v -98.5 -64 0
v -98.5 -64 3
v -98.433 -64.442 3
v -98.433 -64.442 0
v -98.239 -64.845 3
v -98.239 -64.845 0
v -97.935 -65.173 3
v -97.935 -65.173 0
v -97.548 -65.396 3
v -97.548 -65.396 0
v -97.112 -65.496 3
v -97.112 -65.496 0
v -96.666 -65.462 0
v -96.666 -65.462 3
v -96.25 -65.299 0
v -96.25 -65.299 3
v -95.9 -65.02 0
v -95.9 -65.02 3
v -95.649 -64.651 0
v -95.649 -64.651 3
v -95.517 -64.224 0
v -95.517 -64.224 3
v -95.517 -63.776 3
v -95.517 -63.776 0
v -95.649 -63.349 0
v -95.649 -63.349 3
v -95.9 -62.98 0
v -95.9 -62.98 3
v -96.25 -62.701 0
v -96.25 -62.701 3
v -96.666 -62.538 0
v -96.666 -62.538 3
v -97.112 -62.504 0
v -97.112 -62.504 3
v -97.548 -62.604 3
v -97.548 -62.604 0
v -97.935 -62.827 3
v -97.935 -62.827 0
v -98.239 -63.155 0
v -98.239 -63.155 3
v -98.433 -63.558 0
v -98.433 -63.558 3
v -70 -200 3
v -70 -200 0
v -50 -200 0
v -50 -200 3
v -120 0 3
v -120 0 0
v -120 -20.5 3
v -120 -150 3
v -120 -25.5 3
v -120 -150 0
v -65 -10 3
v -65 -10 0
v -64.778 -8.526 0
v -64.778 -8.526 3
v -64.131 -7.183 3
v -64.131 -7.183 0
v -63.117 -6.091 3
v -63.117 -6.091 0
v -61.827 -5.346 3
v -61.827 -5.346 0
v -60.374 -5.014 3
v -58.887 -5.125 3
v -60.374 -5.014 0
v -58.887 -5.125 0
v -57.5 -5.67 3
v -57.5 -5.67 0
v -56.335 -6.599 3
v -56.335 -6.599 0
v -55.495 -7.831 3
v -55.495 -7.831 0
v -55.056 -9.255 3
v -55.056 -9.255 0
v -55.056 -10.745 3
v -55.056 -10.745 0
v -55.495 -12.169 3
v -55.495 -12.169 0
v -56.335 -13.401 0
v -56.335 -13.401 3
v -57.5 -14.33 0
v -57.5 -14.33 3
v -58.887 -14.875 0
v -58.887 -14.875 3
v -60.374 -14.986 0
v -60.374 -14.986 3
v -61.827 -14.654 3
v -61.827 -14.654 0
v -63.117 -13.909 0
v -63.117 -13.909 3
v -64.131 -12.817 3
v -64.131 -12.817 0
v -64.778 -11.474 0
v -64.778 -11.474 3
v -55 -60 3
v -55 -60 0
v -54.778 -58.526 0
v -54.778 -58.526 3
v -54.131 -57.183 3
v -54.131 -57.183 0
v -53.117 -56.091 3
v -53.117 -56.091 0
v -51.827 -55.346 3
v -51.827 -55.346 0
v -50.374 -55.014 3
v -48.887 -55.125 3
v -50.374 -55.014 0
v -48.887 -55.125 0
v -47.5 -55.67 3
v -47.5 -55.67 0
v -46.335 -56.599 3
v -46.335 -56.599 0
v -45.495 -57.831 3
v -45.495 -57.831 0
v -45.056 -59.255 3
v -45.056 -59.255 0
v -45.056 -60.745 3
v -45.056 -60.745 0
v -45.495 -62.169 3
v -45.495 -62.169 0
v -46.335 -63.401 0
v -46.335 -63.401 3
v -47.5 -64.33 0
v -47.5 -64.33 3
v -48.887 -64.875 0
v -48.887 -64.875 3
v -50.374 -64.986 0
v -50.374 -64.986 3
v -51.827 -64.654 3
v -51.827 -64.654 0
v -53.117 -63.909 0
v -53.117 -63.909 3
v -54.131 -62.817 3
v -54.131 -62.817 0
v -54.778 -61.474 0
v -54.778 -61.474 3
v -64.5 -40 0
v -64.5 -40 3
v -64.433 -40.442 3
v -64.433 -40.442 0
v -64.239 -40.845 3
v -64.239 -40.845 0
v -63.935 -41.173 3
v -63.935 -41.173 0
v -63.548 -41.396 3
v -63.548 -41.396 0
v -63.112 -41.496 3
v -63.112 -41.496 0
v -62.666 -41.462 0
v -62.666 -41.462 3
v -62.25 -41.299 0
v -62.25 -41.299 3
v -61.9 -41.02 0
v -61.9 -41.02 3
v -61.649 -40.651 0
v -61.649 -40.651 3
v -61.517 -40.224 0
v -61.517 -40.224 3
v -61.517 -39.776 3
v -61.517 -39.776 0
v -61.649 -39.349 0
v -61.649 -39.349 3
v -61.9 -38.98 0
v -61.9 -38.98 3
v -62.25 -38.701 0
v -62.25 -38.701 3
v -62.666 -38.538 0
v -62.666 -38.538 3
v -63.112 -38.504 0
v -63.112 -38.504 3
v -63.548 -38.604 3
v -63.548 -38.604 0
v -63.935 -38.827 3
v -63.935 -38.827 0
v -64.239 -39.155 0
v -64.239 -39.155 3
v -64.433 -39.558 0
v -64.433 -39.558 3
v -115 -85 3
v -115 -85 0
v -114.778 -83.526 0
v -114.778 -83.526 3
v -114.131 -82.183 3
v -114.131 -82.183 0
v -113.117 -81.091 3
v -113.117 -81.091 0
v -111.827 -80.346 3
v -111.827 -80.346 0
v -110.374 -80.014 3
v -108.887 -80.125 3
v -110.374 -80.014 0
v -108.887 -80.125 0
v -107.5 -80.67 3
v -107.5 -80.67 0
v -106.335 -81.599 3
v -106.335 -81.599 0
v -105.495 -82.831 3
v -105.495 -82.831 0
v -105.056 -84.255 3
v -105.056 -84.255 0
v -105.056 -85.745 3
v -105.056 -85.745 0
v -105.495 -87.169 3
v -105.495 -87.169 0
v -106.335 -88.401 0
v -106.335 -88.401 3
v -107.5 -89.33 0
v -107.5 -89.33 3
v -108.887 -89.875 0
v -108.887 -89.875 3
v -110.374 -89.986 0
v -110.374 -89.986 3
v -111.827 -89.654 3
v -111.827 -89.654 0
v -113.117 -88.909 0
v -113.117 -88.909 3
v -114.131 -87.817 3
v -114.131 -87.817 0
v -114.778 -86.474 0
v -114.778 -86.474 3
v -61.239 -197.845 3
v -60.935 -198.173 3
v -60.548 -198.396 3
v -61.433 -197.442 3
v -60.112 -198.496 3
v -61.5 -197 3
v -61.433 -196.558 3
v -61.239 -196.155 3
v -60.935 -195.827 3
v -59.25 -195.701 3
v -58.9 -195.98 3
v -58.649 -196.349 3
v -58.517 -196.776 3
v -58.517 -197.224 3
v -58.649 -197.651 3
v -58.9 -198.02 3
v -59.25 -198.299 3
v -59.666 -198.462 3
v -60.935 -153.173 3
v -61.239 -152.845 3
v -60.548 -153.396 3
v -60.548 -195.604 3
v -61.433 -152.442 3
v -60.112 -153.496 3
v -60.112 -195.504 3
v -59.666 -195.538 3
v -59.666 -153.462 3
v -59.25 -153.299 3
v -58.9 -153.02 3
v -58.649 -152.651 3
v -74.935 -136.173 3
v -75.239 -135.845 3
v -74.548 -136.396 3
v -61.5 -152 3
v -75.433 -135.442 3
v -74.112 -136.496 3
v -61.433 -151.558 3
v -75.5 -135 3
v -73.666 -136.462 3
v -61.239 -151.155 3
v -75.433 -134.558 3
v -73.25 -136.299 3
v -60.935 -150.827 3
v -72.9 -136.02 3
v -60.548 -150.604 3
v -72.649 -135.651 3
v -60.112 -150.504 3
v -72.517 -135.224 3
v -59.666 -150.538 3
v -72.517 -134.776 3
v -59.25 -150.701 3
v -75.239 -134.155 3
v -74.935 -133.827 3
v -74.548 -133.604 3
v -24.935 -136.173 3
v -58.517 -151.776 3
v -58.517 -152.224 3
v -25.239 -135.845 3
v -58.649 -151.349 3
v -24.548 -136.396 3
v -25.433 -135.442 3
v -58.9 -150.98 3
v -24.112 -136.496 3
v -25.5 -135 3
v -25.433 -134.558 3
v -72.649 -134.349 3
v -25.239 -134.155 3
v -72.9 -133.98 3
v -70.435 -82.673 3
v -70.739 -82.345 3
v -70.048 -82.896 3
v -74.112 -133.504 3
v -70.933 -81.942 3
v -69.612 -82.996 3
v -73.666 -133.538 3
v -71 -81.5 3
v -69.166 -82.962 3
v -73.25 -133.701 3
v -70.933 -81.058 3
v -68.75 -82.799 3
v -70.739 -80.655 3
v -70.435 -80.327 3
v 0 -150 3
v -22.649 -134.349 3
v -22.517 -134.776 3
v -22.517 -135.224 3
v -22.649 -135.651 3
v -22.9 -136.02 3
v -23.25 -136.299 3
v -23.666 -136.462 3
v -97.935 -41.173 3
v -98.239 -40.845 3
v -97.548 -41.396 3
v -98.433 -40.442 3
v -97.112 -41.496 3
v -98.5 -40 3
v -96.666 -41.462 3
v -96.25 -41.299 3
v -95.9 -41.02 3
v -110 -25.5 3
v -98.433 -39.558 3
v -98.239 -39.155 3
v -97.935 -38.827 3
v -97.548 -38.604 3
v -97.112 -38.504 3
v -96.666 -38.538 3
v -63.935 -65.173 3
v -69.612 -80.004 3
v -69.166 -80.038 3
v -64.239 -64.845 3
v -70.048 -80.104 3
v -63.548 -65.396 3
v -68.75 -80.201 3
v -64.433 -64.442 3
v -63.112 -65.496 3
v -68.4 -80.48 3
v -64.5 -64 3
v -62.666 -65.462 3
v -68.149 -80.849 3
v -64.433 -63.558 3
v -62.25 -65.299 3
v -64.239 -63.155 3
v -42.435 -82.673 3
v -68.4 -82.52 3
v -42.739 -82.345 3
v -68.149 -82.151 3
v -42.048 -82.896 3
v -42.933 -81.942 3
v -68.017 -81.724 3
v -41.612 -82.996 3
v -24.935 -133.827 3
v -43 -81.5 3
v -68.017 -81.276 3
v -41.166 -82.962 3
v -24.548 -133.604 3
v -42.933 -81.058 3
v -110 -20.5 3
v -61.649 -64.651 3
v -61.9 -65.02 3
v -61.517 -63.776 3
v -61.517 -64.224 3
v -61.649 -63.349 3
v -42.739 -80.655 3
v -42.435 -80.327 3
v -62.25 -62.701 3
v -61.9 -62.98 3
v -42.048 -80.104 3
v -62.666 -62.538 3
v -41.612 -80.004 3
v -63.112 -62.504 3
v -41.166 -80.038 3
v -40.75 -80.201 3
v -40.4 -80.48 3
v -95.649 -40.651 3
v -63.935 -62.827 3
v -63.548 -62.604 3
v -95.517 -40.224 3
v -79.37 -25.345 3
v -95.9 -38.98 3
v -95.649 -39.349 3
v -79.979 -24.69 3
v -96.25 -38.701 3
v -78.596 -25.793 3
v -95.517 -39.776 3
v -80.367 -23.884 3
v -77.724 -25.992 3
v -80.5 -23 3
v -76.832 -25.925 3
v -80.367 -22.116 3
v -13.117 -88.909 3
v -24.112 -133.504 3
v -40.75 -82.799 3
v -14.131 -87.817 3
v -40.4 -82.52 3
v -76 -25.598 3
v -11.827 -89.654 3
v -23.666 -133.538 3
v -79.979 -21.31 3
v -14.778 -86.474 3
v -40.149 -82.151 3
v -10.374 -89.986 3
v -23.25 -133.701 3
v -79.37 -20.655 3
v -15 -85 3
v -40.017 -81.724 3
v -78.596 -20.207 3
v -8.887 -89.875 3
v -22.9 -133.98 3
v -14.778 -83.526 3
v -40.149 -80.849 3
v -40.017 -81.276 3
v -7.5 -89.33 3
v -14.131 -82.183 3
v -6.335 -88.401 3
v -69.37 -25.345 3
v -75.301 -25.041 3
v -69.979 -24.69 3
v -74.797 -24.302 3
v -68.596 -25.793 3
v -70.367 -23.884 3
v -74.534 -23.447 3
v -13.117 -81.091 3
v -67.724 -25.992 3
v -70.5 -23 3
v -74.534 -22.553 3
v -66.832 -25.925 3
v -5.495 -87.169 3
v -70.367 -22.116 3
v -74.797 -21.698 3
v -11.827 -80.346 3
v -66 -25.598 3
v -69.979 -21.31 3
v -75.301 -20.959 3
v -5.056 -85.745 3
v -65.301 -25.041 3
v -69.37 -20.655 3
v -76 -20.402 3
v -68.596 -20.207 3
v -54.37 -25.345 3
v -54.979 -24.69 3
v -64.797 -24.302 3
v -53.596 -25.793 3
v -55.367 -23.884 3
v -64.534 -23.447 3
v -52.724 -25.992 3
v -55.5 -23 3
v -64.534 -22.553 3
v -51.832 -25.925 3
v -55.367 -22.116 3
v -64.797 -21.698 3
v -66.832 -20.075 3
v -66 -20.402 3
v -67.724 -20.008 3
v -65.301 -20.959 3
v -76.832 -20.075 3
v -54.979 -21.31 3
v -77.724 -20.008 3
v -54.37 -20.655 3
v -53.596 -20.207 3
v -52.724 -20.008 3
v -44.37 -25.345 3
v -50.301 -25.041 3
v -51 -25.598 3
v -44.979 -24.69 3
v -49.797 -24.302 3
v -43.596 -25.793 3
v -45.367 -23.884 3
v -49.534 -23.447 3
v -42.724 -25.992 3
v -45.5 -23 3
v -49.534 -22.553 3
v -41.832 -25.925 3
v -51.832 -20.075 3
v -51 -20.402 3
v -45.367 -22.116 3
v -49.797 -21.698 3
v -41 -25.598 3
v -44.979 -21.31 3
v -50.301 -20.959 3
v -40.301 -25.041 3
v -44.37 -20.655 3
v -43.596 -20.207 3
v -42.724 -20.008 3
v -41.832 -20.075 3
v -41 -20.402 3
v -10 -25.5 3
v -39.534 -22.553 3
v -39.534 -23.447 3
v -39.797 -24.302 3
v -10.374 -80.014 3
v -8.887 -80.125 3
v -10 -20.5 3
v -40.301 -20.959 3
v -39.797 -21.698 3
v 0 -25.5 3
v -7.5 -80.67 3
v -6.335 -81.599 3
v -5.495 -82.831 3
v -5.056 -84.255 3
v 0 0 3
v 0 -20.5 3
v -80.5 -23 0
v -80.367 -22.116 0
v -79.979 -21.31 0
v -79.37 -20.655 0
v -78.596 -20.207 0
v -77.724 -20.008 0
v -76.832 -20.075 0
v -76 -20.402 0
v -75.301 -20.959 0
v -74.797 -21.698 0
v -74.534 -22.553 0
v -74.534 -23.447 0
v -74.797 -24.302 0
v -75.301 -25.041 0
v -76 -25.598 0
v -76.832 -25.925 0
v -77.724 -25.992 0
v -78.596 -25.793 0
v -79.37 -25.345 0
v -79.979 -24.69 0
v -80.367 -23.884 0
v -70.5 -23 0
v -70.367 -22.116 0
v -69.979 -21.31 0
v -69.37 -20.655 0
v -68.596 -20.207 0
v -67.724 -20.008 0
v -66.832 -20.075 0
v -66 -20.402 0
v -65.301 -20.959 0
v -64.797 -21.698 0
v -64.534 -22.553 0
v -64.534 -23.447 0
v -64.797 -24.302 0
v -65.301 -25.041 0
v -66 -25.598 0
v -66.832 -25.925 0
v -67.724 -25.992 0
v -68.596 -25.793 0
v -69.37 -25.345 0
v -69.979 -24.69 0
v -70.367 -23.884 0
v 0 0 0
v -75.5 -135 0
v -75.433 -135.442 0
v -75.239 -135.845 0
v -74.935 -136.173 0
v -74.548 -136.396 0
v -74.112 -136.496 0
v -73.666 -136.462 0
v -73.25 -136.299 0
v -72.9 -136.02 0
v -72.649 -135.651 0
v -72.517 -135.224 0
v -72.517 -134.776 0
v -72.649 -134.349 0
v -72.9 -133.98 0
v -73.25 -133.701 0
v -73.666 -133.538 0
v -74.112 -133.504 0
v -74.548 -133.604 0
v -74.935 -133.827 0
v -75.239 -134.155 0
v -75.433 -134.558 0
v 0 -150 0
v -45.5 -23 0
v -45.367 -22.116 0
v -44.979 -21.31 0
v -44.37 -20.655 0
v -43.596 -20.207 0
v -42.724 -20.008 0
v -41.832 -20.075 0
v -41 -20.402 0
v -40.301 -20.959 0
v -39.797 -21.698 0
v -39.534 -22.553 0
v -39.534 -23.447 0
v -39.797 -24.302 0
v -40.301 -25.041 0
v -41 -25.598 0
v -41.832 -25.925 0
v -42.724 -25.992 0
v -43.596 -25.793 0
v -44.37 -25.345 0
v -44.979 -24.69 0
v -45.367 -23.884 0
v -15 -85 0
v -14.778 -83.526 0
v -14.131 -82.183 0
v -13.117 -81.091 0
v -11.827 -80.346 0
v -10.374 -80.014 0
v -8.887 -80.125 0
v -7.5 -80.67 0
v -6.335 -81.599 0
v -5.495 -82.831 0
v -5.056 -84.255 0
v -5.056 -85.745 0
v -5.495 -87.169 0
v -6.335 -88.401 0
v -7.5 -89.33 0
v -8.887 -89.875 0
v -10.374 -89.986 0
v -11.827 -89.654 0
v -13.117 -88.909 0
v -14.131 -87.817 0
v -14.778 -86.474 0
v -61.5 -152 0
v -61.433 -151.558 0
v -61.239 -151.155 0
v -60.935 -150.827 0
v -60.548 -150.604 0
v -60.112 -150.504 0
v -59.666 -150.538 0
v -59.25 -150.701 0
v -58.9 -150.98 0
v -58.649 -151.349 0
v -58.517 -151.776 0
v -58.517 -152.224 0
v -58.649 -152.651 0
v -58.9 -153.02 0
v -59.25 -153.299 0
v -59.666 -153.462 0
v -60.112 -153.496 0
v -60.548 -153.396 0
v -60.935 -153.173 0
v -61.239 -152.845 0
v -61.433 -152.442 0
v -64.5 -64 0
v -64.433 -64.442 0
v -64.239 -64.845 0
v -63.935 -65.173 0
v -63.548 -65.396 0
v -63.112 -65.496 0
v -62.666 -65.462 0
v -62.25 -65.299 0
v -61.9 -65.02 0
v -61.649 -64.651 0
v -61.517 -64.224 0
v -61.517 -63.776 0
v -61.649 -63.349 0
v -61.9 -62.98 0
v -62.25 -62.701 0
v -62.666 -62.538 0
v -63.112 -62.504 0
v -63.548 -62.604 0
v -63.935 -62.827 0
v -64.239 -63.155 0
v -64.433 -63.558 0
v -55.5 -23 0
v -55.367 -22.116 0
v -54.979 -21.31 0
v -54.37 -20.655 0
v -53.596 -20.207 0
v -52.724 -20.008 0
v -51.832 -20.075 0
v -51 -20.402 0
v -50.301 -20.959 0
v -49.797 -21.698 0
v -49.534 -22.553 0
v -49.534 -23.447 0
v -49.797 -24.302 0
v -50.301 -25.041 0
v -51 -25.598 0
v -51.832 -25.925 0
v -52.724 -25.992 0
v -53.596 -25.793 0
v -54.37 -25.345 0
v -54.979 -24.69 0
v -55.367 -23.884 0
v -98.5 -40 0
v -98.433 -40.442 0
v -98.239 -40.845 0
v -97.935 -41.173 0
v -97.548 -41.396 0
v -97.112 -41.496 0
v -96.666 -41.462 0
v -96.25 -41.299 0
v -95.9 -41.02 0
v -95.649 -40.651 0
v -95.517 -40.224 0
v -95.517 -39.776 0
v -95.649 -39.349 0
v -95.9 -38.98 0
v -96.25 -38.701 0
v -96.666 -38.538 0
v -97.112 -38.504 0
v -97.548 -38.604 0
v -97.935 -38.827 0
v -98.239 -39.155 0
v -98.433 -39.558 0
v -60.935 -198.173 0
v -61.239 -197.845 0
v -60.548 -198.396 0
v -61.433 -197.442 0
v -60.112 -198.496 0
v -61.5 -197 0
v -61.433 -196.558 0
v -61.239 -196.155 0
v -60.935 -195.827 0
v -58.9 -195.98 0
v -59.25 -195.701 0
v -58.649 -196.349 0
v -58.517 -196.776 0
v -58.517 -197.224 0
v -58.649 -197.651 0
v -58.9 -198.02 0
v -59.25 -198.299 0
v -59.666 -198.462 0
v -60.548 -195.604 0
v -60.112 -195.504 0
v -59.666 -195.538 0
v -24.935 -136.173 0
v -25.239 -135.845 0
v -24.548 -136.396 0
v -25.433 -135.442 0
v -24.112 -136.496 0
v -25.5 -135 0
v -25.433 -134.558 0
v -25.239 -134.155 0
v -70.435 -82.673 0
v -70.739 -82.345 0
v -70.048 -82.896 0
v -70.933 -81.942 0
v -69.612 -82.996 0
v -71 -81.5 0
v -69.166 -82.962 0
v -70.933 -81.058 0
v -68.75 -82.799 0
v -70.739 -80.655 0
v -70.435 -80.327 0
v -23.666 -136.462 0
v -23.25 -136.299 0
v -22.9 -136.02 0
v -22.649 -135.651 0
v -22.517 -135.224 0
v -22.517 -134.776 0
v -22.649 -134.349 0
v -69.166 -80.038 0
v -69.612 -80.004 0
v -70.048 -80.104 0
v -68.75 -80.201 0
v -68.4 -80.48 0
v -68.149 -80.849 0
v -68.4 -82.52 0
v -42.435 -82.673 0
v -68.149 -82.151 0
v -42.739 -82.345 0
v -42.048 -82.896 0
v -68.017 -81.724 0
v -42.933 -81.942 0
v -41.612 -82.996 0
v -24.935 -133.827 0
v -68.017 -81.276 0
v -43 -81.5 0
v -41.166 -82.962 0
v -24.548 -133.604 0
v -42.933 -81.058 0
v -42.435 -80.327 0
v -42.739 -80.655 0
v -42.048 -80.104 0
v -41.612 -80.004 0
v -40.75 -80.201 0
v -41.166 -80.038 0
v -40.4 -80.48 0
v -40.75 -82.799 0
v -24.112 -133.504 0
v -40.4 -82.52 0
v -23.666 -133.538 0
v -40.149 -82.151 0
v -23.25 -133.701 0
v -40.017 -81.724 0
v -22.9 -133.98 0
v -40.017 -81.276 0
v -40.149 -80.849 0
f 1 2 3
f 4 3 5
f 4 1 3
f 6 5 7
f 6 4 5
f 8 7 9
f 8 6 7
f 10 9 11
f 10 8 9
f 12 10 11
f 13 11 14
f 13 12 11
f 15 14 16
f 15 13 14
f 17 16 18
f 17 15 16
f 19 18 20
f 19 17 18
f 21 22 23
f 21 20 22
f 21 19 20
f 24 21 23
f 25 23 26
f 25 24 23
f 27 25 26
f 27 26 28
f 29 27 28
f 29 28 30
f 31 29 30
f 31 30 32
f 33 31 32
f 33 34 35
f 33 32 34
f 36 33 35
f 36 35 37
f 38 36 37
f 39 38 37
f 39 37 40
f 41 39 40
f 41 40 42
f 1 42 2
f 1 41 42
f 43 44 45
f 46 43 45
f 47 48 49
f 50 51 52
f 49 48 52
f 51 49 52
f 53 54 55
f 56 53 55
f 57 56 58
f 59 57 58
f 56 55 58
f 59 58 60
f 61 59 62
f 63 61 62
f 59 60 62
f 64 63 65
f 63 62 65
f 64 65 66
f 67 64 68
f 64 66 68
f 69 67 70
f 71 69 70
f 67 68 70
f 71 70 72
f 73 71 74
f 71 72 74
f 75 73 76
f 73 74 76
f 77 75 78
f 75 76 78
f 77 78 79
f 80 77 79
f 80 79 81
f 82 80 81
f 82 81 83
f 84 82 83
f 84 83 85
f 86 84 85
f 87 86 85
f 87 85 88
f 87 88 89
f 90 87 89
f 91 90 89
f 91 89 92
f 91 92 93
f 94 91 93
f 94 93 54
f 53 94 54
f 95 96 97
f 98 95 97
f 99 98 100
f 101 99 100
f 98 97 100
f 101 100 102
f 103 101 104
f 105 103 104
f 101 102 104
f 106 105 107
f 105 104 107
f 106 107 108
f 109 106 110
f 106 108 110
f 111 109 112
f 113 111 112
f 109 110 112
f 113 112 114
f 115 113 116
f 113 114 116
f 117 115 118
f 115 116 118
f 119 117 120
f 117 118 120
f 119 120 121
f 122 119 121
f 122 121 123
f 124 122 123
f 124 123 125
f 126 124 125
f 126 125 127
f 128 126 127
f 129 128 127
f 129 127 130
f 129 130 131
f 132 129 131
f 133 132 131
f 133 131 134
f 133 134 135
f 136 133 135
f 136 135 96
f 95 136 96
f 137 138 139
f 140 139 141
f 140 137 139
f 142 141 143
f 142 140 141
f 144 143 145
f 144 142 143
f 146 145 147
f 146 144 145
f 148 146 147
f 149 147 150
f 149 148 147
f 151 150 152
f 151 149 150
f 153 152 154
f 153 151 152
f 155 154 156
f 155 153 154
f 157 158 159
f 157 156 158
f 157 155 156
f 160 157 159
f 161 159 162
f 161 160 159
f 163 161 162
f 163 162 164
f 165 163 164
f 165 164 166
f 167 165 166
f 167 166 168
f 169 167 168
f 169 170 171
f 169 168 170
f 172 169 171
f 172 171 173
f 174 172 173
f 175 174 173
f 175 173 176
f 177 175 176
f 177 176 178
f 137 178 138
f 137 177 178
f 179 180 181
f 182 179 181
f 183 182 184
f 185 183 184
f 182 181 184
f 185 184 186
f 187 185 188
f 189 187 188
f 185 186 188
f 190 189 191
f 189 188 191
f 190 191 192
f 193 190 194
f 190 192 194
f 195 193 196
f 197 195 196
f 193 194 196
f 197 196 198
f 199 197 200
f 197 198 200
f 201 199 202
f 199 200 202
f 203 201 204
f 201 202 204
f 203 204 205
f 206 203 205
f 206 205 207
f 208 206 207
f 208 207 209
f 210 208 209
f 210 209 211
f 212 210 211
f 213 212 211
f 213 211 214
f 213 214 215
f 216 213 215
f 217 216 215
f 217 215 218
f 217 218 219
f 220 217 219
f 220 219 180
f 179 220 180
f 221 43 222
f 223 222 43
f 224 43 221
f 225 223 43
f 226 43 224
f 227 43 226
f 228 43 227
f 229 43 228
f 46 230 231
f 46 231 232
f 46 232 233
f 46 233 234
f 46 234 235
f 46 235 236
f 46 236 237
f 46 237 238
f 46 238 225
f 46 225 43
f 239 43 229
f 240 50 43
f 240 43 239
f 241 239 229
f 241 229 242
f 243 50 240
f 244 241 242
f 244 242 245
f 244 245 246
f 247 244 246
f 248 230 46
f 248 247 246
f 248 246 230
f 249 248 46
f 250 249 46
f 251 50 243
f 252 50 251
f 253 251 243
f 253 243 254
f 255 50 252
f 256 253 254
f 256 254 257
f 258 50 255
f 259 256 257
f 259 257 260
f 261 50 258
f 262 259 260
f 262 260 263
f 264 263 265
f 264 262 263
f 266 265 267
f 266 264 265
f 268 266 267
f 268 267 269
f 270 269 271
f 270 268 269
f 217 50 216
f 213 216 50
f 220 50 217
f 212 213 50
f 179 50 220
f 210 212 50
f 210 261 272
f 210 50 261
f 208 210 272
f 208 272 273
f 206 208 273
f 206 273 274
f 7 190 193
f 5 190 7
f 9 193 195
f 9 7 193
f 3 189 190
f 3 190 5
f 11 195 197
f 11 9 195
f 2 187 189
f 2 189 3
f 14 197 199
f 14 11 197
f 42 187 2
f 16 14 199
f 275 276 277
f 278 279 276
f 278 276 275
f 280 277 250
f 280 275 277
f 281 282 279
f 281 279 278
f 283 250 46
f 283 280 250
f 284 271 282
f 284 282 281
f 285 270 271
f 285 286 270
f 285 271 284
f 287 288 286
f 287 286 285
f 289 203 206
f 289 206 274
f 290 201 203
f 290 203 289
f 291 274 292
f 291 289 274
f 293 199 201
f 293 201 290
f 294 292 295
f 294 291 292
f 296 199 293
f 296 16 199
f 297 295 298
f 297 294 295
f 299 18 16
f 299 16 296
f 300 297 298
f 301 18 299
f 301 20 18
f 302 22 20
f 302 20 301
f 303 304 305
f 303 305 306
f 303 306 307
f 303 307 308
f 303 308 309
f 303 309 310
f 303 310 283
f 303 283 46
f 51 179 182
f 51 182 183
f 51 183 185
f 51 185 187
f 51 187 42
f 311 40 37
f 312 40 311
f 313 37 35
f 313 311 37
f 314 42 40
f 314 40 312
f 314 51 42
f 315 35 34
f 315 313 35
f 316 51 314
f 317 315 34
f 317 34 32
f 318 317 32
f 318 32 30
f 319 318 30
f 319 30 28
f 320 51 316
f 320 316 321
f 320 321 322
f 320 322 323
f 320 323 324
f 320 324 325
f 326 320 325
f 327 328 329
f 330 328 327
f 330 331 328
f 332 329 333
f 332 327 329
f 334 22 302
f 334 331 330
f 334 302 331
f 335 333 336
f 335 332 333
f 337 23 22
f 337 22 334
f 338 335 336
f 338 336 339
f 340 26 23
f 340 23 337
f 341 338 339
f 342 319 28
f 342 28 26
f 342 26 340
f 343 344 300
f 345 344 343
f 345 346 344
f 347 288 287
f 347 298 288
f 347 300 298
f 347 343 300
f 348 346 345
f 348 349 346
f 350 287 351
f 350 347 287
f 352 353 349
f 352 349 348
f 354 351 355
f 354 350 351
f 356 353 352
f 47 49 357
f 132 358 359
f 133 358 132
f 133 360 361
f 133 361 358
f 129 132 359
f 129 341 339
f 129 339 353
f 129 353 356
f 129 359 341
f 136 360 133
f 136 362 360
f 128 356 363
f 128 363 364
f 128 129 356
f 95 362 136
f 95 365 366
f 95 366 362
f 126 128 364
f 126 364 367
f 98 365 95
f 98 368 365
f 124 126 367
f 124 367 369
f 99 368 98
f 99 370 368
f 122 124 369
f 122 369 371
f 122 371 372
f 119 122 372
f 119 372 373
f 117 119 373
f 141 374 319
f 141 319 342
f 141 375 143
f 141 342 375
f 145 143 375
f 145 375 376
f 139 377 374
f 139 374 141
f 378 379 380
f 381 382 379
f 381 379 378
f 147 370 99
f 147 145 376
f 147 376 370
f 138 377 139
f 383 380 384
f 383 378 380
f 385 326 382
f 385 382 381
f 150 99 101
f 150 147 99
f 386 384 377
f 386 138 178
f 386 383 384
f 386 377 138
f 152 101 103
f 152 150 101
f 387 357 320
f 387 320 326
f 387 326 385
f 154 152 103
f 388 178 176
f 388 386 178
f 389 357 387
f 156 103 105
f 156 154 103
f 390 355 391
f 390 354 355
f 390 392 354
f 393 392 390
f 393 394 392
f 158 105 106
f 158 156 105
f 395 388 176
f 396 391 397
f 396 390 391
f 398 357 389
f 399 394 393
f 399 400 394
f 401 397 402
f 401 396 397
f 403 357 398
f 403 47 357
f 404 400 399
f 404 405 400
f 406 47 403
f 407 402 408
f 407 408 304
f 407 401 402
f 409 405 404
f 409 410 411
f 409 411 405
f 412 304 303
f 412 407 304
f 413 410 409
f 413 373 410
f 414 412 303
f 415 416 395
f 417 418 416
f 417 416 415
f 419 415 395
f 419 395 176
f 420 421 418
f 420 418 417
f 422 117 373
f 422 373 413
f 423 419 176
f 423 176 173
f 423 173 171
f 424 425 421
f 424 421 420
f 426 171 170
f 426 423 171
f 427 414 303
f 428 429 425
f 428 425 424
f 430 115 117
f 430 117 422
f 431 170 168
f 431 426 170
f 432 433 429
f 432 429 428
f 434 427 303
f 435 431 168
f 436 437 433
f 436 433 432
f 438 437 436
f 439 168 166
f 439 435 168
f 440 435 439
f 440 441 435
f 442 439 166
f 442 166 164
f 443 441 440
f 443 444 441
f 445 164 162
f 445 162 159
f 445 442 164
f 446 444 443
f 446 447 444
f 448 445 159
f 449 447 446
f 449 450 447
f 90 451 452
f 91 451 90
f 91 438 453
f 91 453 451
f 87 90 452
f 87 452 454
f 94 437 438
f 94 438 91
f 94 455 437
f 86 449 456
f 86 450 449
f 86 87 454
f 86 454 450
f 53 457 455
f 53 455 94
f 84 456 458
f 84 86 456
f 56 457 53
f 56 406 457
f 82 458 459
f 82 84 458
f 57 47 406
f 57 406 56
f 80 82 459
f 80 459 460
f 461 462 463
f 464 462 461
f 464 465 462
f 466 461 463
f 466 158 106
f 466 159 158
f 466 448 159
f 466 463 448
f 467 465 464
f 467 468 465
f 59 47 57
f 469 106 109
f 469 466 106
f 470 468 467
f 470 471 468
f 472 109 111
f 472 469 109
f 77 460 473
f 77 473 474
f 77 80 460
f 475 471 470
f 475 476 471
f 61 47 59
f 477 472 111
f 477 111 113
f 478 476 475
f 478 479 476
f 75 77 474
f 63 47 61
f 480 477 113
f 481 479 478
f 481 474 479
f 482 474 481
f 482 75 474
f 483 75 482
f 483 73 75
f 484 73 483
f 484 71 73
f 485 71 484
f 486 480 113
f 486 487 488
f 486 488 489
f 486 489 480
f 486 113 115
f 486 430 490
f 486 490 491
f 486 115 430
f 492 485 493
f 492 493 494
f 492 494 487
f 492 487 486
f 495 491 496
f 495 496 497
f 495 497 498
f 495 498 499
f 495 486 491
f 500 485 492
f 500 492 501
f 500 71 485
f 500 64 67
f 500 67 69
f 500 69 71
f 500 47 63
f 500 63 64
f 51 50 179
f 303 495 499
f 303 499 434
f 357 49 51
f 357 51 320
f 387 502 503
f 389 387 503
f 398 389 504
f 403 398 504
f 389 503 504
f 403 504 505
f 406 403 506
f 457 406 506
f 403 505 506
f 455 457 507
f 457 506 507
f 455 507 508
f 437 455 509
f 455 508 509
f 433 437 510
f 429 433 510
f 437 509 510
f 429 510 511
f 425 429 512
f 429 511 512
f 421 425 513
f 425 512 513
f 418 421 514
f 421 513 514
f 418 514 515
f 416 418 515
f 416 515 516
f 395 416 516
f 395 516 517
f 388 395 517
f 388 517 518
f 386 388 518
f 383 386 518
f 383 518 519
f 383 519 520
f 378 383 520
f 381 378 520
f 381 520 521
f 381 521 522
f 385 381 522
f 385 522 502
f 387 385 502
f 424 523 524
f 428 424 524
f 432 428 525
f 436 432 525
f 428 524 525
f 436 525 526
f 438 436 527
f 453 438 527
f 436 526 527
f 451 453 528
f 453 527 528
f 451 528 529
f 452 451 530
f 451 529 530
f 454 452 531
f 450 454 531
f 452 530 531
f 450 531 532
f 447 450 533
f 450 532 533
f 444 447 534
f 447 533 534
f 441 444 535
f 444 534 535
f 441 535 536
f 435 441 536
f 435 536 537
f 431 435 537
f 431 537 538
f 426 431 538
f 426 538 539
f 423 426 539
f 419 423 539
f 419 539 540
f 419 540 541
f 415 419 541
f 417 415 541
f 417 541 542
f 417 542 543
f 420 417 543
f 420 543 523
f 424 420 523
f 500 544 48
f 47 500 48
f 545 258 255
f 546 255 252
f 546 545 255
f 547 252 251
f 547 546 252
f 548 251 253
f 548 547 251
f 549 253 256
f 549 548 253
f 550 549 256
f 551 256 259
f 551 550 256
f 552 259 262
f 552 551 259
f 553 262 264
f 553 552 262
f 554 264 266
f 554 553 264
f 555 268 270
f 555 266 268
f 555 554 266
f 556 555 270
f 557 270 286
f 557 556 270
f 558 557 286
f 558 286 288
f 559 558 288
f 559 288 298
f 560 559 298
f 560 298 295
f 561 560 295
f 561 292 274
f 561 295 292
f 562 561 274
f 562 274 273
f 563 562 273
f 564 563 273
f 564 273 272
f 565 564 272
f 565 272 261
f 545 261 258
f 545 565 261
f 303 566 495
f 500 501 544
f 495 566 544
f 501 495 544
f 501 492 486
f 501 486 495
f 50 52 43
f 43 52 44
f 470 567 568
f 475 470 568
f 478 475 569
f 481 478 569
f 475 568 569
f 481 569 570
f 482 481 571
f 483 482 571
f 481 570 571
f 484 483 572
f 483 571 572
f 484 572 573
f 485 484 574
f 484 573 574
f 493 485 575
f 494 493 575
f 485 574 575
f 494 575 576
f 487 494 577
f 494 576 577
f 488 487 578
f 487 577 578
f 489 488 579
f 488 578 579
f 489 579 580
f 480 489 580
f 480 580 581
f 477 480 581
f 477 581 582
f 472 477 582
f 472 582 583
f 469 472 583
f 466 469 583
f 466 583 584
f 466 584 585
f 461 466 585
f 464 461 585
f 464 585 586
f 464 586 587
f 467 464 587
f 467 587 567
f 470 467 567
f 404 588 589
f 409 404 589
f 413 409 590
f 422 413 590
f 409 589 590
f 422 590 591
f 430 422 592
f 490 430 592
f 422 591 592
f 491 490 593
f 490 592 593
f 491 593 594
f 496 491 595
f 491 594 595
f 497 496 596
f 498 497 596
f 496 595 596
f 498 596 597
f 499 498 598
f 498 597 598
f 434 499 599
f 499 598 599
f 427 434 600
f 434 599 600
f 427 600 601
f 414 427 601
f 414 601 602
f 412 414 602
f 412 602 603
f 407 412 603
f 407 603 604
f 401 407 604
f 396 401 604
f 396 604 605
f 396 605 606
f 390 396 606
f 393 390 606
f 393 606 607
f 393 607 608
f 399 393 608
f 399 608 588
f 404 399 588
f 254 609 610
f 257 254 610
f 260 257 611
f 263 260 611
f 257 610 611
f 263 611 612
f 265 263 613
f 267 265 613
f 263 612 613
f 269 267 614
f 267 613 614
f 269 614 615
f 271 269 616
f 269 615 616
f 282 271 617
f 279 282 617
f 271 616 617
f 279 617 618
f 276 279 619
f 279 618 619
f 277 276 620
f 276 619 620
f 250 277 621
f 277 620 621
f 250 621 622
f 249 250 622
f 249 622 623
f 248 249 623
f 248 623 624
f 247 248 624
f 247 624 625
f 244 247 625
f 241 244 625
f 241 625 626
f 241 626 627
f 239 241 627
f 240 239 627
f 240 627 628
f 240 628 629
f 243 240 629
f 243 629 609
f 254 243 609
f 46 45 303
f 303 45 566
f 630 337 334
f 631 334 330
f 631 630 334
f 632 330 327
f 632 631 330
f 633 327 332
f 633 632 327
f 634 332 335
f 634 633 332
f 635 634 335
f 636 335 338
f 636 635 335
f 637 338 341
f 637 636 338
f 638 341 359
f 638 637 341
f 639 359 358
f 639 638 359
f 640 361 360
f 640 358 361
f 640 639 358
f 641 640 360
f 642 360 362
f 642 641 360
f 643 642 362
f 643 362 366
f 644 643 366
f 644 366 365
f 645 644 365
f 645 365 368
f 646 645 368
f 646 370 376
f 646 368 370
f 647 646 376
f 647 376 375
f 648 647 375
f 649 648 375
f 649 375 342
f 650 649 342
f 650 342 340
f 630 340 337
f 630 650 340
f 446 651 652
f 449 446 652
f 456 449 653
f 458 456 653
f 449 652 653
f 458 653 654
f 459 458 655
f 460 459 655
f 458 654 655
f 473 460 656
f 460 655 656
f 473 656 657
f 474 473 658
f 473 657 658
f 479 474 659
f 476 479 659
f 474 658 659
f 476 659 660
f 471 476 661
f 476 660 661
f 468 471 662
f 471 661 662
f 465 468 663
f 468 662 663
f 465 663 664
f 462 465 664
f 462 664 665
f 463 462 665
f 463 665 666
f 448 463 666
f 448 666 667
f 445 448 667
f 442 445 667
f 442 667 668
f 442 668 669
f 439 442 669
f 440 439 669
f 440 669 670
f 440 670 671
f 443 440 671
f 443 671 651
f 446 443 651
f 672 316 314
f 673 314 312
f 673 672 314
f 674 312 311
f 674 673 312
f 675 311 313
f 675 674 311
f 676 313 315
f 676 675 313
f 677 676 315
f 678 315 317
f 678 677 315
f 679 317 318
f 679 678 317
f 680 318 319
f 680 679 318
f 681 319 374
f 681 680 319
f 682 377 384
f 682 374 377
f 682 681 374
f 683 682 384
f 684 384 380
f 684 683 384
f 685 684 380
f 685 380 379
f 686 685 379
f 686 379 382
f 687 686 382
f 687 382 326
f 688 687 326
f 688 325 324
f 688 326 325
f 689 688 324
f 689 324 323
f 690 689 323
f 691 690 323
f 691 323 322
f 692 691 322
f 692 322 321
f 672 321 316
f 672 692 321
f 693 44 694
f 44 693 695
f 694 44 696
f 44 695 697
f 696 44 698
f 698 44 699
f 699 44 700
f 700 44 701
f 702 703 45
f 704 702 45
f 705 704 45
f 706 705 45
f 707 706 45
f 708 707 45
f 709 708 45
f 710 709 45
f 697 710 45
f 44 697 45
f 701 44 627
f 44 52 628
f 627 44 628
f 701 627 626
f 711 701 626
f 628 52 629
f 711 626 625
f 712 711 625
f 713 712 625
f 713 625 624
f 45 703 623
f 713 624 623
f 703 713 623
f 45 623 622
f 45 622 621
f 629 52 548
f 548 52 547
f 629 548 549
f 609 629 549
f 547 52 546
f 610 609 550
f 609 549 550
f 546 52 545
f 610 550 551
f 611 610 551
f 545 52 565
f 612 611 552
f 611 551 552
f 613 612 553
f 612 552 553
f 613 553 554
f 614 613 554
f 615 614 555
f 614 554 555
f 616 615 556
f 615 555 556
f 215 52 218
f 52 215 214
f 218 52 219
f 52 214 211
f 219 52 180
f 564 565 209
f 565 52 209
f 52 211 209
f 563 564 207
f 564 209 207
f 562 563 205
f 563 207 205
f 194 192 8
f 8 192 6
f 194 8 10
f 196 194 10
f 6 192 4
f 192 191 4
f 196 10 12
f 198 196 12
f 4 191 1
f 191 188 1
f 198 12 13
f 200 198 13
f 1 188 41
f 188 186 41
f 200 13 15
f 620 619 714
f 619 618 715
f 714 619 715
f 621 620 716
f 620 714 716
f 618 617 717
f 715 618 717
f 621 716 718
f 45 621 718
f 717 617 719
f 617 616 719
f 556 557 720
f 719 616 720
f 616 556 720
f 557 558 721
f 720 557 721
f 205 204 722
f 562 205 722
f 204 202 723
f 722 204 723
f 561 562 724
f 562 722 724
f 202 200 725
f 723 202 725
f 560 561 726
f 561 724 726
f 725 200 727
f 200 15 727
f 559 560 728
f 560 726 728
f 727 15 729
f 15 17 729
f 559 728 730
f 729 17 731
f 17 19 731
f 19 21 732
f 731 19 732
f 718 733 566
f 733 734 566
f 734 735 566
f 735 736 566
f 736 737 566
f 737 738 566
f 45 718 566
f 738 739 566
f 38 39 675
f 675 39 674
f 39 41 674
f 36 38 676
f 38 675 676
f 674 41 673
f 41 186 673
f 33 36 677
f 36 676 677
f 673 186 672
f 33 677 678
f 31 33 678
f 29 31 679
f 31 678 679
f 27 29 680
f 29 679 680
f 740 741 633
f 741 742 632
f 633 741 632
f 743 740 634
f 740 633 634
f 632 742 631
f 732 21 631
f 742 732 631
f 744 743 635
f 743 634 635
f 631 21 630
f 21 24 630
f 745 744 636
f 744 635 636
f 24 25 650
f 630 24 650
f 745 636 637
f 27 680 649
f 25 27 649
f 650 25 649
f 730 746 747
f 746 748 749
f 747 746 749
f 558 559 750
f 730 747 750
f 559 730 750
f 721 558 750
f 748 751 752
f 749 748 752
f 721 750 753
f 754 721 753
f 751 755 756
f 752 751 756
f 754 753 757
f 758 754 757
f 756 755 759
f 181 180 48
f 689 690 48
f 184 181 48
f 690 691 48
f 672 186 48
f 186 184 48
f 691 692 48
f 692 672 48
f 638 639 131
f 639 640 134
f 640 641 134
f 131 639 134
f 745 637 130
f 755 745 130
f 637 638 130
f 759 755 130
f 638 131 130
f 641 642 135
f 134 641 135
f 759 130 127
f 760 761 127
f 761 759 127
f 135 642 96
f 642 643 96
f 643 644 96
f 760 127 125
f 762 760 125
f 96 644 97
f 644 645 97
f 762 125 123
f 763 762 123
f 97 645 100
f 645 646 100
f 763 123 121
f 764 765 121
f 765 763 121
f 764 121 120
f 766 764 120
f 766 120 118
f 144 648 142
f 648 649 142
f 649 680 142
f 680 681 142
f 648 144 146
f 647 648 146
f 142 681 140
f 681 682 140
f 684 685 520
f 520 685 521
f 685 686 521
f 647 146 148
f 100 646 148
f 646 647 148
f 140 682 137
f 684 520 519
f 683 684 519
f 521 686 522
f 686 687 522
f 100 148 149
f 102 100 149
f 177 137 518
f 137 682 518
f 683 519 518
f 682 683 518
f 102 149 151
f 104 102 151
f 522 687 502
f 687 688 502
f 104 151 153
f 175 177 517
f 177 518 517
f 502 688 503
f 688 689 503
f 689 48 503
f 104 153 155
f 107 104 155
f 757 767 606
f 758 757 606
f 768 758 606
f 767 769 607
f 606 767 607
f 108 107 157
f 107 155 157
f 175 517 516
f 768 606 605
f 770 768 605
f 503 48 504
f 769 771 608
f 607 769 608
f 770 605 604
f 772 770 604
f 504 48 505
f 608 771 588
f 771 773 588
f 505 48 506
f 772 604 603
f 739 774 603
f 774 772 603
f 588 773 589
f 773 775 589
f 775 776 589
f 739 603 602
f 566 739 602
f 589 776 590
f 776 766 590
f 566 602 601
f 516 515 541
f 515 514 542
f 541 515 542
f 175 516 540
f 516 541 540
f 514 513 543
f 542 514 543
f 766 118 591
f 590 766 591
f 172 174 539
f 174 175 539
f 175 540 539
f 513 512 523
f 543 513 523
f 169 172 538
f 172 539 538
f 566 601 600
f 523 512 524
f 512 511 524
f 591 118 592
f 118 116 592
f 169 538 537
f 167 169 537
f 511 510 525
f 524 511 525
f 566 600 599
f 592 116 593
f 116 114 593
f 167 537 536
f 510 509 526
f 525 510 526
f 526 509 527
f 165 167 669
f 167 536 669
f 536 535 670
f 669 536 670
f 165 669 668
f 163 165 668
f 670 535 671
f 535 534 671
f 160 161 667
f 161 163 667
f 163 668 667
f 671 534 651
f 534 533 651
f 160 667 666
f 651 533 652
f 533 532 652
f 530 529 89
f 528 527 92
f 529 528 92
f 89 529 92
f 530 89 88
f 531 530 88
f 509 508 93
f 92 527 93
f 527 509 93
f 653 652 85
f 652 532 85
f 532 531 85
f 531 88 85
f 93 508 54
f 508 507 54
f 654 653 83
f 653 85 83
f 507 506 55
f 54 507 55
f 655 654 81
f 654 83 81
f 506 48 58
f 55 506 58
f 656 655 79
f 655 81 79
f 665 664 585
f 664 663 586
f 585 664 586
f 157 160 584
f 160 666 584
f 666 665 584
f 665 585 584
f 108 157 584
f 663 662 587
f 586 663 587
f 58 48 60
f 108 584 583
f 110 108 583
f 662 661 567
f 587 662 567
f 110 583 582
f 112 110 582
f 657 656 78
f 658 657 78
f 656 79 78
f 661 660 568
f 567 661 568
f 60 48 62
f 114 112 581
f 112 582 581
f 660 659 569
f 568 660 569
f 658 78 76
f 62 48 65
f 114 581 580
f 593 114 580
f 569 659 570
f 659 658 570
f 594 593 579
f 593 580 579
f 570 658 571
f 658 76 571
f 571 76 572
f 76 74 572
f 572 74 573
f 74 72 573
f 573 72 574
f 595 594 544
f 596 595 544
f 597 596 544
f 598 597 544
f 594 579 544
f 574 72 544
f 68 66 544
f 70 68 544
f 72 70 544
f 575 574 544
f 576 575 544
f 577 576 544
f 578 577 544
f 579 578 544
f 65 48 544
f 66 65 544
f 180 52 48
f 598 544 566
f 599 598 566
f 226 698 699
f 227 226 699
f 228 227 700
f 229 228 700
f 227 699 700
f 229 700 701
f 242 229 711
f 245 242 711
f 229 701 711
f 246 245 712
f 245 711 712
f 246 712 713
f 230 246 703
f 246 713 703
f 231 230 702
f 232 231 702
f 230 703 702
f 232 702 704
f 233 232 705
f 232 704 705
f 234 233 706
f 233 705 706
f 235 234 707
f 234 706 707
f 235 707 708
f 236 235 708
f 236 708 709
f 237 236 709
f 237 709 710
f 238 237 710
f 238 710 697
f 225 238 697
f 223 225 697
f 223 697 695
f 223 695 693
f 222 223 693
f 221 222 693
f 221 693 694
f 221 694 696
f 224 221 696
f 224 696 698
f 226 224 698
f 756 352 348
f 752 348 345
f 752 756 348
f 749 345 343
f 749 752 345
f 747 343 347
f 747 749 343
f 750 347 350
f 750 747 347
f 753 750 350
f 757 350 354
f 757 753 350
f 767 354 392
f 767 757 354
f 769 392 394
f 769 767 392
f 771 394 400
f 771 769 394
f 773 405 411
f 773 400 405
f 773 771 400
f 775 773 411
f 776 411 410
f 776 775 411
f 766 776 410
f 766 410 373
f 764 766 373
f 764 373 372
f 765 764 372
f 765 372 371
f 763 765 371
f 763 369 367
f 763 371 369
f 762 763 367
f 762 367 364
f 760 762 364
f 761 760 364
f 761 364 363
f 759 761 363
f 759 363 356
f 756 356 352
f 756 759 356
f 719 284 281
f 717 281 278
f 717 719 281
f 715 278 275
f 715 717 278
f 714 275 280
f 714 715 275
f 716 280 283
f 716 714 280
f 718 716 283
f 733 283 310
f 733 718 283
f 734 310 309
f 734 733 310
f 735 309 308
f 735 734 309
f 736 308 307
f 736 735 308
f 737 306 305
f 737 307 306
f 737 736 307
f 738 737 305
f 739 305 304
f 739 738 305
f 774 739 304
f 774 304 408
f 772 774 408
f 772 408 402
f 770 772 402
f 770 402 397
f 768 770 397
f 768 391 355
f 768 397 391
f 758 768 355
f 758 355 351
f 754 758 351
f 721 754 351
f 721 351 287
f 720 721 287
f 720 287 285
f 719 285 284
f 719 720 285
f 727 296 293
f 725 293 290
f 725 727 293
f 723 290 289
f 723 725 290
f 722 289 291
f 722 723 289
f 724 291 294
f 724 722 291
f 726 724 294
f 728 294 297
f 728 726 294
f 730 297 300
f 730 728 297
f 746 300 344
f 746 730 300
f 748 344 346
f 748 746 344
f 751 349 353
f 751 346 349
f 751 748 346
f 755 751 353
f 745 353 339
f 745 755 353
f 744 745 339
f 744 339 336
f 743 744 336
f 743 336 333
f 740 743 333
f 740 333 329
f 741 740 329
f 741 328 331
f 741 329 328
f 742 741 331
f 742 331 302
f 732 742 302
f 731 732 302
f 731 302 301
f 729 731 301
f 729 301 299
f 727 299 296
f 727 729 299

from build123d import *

# Parameters (mm, degrees)
EXTRUSION1_DEPTH        = 3
ESQUISSE2_R             = 1.5
ENL_V_MAT_EXTRU_1_DEPTH = 16
ESQUISSE3_R             = 5
ENL_V_MAT_EXTRU_2_DEPTH = 16
ESQUISSE4_R             = 5
ENL_V_MAT_EXTRU_3_DEPTH = 16
ESQUISSE5_R             = 1.5
ENL_V_MAT_EXTRU_4_DEPTH = 25.792218749
ESQUISSE8_R             = 3
ENL_V_MAT_EXTRU_5_DEPTH = 8
ESQUISSE9_R             = 1.5
ENL_V_MAT_EXTRU_6_DEPTH = 10
ESQUISSE11_W            = 10
ESQUISSE11_H            = 5
ENL_V_MAT_EXTRU_9_DEPTH = 0.0001


with BuildPart() as part:
    # Esquisse1 → Extrusion1 (new body)
    with BuildSketch(Plane.XY):
        Polygon((0, 0), (-120, 0), (-120, -150), (-70, -200), (-50, -200), (0, -150), align=None)
    extrude(amount=EXTRUSION1_DEPTH)

    # Esquisse2 → Enlèv. mat.-Extru.1 (cut)
    with BuildSketch(Plane.XY):
        with Locations(Location((-69.5, -81.5, 0), (0, 0, 180))):
            Circle(ESQUISSE2_R)
        with Locations(Location((-41.5, -81.5, 0), (0, 0, 180))):
            Circle(ESQUISSE2_R)
        with Locations(Location((-74, -135, 0), (0, 0, 180))):
            Circle(ESQUISSE2_R)
        with Locations(Location((-24, -135, 0), (0, 0, 180))):
            Circle(ESQUISSE2_R)
    extrude(amount=ENL_V_MAT_EXTRU_1_DEPTH, mode=Mode.SUBTRACT)

    # Esquisse3 → Enlèv. mat.-Extru.2 (cut)
    with BuildSketch(Plane(origin=(0, 0, 0), x_dir=(-1, 0, 0), z_dir=(0, 0, -1))):
        with Locations((50, -60)):
            Circle(ESQUISSE3_R)
    extrude(amount=-ENL_V_MAT_EXTRU_2_DEPTH, mode=Mode.SUBTRACT)

    # Esquisse4 → Enlèv. mat.-Extru.3 (cut)
    with BuildSketch(Plane(origin=(0, 0, 0), x_dir=(-1, 0, 0), z_dir=(0, 0, -1))):
        with Locations((60, -10)):
            Circle(ESQUISSE4_R)
        with Locations((10, -85)):
            Circle(ESQUISSE4_R)
        with Locations((110, -85)):
            Circle(ESQUISSE4_R)
    extrude(amount=-ENL_V_MAT_EXTRU_3_DEPTH, mode=Mode.SUBTRACT)

    # Esquisse5 → Enlèv. mat.-Extru.4 (cut)
    with BuildSketch(Plane.XY):
        with Locations(Location((-97, -40, 0), (0, 0, 180))):
            Circle(ESQUISSE5_R)
        with Locations(Location((-63, -40, 0), (0, 0, 180))):
            Circle(ESQUISSE5_R)
        with Locations(Location((-63, -64, 0), (0, 0, 180))):
            Circle(ESQUISSE5_R)
        with Locations(Location((-97, -64, 0), (0, 0, 180))):
            Circle(ESQUISSE5_R)
    extrude(amount=ENL_V_MAT_EXTRU_4_DEPTH, mode=Mode.SUBTRACT)

    # Esquisse8 → Enlèv. mat.-Extru.5 (cut)
    with BuildSketch(Plane(origin=(0, 0, 0), x_dir=(-1, 0, 0), z_dir=(0, 0, -1))):
        with Locations((52.5, -23)):
            Circle(ESQUISSE8_R)
        with Locations((42.5, -23)):
            Circle(ESQUISSE8_R)
        with Locations((67.5, -23)):
            Circle(ESQUISSE8_R)
        with Locations((77.5, -23)):
            Circle(ESQUISSE8_R)
    extrude(amount=-ENL_V_MAT_EXTRU_5_DEPTH, mode=Mode.SUBTRACT)

    # Esquisse9 → Enlèv. mat.-Extru.6 (cut)
    with BuildSketch(Plane(origin=(0, 0, 0), x_dir=(-1, 0, 0), z_dir=(0, 0, -1))):
        with Locations((60, -152)):
            Circle(ESQUISSE9_R)
        with Locations((60, -197)):
            Circle(ESQUISSE9_R)
    extrude(amount=-ENL_V_MAT_EXTRU_6_DEPTH, mode=Mode.SUBTRACT)

    # Esquisse11 → Enlèv. mat.-Extru.9 (cut)
    with BuildSketch(Plane.XY.offset(3)):
        with Locations((-115, -23)):
            Rectangle(ESQUISSE11_W, ESQUISSE11_H)
        with Locations((-5, -23)):
            Rectangle(ESQUISSE11_W, ESQUISSE11_H)
    extrude(amount=-ENL_V_MAT_EXTRU_9_DEPTH, mode=Mode.SUBTRACT)


solid = part.part
